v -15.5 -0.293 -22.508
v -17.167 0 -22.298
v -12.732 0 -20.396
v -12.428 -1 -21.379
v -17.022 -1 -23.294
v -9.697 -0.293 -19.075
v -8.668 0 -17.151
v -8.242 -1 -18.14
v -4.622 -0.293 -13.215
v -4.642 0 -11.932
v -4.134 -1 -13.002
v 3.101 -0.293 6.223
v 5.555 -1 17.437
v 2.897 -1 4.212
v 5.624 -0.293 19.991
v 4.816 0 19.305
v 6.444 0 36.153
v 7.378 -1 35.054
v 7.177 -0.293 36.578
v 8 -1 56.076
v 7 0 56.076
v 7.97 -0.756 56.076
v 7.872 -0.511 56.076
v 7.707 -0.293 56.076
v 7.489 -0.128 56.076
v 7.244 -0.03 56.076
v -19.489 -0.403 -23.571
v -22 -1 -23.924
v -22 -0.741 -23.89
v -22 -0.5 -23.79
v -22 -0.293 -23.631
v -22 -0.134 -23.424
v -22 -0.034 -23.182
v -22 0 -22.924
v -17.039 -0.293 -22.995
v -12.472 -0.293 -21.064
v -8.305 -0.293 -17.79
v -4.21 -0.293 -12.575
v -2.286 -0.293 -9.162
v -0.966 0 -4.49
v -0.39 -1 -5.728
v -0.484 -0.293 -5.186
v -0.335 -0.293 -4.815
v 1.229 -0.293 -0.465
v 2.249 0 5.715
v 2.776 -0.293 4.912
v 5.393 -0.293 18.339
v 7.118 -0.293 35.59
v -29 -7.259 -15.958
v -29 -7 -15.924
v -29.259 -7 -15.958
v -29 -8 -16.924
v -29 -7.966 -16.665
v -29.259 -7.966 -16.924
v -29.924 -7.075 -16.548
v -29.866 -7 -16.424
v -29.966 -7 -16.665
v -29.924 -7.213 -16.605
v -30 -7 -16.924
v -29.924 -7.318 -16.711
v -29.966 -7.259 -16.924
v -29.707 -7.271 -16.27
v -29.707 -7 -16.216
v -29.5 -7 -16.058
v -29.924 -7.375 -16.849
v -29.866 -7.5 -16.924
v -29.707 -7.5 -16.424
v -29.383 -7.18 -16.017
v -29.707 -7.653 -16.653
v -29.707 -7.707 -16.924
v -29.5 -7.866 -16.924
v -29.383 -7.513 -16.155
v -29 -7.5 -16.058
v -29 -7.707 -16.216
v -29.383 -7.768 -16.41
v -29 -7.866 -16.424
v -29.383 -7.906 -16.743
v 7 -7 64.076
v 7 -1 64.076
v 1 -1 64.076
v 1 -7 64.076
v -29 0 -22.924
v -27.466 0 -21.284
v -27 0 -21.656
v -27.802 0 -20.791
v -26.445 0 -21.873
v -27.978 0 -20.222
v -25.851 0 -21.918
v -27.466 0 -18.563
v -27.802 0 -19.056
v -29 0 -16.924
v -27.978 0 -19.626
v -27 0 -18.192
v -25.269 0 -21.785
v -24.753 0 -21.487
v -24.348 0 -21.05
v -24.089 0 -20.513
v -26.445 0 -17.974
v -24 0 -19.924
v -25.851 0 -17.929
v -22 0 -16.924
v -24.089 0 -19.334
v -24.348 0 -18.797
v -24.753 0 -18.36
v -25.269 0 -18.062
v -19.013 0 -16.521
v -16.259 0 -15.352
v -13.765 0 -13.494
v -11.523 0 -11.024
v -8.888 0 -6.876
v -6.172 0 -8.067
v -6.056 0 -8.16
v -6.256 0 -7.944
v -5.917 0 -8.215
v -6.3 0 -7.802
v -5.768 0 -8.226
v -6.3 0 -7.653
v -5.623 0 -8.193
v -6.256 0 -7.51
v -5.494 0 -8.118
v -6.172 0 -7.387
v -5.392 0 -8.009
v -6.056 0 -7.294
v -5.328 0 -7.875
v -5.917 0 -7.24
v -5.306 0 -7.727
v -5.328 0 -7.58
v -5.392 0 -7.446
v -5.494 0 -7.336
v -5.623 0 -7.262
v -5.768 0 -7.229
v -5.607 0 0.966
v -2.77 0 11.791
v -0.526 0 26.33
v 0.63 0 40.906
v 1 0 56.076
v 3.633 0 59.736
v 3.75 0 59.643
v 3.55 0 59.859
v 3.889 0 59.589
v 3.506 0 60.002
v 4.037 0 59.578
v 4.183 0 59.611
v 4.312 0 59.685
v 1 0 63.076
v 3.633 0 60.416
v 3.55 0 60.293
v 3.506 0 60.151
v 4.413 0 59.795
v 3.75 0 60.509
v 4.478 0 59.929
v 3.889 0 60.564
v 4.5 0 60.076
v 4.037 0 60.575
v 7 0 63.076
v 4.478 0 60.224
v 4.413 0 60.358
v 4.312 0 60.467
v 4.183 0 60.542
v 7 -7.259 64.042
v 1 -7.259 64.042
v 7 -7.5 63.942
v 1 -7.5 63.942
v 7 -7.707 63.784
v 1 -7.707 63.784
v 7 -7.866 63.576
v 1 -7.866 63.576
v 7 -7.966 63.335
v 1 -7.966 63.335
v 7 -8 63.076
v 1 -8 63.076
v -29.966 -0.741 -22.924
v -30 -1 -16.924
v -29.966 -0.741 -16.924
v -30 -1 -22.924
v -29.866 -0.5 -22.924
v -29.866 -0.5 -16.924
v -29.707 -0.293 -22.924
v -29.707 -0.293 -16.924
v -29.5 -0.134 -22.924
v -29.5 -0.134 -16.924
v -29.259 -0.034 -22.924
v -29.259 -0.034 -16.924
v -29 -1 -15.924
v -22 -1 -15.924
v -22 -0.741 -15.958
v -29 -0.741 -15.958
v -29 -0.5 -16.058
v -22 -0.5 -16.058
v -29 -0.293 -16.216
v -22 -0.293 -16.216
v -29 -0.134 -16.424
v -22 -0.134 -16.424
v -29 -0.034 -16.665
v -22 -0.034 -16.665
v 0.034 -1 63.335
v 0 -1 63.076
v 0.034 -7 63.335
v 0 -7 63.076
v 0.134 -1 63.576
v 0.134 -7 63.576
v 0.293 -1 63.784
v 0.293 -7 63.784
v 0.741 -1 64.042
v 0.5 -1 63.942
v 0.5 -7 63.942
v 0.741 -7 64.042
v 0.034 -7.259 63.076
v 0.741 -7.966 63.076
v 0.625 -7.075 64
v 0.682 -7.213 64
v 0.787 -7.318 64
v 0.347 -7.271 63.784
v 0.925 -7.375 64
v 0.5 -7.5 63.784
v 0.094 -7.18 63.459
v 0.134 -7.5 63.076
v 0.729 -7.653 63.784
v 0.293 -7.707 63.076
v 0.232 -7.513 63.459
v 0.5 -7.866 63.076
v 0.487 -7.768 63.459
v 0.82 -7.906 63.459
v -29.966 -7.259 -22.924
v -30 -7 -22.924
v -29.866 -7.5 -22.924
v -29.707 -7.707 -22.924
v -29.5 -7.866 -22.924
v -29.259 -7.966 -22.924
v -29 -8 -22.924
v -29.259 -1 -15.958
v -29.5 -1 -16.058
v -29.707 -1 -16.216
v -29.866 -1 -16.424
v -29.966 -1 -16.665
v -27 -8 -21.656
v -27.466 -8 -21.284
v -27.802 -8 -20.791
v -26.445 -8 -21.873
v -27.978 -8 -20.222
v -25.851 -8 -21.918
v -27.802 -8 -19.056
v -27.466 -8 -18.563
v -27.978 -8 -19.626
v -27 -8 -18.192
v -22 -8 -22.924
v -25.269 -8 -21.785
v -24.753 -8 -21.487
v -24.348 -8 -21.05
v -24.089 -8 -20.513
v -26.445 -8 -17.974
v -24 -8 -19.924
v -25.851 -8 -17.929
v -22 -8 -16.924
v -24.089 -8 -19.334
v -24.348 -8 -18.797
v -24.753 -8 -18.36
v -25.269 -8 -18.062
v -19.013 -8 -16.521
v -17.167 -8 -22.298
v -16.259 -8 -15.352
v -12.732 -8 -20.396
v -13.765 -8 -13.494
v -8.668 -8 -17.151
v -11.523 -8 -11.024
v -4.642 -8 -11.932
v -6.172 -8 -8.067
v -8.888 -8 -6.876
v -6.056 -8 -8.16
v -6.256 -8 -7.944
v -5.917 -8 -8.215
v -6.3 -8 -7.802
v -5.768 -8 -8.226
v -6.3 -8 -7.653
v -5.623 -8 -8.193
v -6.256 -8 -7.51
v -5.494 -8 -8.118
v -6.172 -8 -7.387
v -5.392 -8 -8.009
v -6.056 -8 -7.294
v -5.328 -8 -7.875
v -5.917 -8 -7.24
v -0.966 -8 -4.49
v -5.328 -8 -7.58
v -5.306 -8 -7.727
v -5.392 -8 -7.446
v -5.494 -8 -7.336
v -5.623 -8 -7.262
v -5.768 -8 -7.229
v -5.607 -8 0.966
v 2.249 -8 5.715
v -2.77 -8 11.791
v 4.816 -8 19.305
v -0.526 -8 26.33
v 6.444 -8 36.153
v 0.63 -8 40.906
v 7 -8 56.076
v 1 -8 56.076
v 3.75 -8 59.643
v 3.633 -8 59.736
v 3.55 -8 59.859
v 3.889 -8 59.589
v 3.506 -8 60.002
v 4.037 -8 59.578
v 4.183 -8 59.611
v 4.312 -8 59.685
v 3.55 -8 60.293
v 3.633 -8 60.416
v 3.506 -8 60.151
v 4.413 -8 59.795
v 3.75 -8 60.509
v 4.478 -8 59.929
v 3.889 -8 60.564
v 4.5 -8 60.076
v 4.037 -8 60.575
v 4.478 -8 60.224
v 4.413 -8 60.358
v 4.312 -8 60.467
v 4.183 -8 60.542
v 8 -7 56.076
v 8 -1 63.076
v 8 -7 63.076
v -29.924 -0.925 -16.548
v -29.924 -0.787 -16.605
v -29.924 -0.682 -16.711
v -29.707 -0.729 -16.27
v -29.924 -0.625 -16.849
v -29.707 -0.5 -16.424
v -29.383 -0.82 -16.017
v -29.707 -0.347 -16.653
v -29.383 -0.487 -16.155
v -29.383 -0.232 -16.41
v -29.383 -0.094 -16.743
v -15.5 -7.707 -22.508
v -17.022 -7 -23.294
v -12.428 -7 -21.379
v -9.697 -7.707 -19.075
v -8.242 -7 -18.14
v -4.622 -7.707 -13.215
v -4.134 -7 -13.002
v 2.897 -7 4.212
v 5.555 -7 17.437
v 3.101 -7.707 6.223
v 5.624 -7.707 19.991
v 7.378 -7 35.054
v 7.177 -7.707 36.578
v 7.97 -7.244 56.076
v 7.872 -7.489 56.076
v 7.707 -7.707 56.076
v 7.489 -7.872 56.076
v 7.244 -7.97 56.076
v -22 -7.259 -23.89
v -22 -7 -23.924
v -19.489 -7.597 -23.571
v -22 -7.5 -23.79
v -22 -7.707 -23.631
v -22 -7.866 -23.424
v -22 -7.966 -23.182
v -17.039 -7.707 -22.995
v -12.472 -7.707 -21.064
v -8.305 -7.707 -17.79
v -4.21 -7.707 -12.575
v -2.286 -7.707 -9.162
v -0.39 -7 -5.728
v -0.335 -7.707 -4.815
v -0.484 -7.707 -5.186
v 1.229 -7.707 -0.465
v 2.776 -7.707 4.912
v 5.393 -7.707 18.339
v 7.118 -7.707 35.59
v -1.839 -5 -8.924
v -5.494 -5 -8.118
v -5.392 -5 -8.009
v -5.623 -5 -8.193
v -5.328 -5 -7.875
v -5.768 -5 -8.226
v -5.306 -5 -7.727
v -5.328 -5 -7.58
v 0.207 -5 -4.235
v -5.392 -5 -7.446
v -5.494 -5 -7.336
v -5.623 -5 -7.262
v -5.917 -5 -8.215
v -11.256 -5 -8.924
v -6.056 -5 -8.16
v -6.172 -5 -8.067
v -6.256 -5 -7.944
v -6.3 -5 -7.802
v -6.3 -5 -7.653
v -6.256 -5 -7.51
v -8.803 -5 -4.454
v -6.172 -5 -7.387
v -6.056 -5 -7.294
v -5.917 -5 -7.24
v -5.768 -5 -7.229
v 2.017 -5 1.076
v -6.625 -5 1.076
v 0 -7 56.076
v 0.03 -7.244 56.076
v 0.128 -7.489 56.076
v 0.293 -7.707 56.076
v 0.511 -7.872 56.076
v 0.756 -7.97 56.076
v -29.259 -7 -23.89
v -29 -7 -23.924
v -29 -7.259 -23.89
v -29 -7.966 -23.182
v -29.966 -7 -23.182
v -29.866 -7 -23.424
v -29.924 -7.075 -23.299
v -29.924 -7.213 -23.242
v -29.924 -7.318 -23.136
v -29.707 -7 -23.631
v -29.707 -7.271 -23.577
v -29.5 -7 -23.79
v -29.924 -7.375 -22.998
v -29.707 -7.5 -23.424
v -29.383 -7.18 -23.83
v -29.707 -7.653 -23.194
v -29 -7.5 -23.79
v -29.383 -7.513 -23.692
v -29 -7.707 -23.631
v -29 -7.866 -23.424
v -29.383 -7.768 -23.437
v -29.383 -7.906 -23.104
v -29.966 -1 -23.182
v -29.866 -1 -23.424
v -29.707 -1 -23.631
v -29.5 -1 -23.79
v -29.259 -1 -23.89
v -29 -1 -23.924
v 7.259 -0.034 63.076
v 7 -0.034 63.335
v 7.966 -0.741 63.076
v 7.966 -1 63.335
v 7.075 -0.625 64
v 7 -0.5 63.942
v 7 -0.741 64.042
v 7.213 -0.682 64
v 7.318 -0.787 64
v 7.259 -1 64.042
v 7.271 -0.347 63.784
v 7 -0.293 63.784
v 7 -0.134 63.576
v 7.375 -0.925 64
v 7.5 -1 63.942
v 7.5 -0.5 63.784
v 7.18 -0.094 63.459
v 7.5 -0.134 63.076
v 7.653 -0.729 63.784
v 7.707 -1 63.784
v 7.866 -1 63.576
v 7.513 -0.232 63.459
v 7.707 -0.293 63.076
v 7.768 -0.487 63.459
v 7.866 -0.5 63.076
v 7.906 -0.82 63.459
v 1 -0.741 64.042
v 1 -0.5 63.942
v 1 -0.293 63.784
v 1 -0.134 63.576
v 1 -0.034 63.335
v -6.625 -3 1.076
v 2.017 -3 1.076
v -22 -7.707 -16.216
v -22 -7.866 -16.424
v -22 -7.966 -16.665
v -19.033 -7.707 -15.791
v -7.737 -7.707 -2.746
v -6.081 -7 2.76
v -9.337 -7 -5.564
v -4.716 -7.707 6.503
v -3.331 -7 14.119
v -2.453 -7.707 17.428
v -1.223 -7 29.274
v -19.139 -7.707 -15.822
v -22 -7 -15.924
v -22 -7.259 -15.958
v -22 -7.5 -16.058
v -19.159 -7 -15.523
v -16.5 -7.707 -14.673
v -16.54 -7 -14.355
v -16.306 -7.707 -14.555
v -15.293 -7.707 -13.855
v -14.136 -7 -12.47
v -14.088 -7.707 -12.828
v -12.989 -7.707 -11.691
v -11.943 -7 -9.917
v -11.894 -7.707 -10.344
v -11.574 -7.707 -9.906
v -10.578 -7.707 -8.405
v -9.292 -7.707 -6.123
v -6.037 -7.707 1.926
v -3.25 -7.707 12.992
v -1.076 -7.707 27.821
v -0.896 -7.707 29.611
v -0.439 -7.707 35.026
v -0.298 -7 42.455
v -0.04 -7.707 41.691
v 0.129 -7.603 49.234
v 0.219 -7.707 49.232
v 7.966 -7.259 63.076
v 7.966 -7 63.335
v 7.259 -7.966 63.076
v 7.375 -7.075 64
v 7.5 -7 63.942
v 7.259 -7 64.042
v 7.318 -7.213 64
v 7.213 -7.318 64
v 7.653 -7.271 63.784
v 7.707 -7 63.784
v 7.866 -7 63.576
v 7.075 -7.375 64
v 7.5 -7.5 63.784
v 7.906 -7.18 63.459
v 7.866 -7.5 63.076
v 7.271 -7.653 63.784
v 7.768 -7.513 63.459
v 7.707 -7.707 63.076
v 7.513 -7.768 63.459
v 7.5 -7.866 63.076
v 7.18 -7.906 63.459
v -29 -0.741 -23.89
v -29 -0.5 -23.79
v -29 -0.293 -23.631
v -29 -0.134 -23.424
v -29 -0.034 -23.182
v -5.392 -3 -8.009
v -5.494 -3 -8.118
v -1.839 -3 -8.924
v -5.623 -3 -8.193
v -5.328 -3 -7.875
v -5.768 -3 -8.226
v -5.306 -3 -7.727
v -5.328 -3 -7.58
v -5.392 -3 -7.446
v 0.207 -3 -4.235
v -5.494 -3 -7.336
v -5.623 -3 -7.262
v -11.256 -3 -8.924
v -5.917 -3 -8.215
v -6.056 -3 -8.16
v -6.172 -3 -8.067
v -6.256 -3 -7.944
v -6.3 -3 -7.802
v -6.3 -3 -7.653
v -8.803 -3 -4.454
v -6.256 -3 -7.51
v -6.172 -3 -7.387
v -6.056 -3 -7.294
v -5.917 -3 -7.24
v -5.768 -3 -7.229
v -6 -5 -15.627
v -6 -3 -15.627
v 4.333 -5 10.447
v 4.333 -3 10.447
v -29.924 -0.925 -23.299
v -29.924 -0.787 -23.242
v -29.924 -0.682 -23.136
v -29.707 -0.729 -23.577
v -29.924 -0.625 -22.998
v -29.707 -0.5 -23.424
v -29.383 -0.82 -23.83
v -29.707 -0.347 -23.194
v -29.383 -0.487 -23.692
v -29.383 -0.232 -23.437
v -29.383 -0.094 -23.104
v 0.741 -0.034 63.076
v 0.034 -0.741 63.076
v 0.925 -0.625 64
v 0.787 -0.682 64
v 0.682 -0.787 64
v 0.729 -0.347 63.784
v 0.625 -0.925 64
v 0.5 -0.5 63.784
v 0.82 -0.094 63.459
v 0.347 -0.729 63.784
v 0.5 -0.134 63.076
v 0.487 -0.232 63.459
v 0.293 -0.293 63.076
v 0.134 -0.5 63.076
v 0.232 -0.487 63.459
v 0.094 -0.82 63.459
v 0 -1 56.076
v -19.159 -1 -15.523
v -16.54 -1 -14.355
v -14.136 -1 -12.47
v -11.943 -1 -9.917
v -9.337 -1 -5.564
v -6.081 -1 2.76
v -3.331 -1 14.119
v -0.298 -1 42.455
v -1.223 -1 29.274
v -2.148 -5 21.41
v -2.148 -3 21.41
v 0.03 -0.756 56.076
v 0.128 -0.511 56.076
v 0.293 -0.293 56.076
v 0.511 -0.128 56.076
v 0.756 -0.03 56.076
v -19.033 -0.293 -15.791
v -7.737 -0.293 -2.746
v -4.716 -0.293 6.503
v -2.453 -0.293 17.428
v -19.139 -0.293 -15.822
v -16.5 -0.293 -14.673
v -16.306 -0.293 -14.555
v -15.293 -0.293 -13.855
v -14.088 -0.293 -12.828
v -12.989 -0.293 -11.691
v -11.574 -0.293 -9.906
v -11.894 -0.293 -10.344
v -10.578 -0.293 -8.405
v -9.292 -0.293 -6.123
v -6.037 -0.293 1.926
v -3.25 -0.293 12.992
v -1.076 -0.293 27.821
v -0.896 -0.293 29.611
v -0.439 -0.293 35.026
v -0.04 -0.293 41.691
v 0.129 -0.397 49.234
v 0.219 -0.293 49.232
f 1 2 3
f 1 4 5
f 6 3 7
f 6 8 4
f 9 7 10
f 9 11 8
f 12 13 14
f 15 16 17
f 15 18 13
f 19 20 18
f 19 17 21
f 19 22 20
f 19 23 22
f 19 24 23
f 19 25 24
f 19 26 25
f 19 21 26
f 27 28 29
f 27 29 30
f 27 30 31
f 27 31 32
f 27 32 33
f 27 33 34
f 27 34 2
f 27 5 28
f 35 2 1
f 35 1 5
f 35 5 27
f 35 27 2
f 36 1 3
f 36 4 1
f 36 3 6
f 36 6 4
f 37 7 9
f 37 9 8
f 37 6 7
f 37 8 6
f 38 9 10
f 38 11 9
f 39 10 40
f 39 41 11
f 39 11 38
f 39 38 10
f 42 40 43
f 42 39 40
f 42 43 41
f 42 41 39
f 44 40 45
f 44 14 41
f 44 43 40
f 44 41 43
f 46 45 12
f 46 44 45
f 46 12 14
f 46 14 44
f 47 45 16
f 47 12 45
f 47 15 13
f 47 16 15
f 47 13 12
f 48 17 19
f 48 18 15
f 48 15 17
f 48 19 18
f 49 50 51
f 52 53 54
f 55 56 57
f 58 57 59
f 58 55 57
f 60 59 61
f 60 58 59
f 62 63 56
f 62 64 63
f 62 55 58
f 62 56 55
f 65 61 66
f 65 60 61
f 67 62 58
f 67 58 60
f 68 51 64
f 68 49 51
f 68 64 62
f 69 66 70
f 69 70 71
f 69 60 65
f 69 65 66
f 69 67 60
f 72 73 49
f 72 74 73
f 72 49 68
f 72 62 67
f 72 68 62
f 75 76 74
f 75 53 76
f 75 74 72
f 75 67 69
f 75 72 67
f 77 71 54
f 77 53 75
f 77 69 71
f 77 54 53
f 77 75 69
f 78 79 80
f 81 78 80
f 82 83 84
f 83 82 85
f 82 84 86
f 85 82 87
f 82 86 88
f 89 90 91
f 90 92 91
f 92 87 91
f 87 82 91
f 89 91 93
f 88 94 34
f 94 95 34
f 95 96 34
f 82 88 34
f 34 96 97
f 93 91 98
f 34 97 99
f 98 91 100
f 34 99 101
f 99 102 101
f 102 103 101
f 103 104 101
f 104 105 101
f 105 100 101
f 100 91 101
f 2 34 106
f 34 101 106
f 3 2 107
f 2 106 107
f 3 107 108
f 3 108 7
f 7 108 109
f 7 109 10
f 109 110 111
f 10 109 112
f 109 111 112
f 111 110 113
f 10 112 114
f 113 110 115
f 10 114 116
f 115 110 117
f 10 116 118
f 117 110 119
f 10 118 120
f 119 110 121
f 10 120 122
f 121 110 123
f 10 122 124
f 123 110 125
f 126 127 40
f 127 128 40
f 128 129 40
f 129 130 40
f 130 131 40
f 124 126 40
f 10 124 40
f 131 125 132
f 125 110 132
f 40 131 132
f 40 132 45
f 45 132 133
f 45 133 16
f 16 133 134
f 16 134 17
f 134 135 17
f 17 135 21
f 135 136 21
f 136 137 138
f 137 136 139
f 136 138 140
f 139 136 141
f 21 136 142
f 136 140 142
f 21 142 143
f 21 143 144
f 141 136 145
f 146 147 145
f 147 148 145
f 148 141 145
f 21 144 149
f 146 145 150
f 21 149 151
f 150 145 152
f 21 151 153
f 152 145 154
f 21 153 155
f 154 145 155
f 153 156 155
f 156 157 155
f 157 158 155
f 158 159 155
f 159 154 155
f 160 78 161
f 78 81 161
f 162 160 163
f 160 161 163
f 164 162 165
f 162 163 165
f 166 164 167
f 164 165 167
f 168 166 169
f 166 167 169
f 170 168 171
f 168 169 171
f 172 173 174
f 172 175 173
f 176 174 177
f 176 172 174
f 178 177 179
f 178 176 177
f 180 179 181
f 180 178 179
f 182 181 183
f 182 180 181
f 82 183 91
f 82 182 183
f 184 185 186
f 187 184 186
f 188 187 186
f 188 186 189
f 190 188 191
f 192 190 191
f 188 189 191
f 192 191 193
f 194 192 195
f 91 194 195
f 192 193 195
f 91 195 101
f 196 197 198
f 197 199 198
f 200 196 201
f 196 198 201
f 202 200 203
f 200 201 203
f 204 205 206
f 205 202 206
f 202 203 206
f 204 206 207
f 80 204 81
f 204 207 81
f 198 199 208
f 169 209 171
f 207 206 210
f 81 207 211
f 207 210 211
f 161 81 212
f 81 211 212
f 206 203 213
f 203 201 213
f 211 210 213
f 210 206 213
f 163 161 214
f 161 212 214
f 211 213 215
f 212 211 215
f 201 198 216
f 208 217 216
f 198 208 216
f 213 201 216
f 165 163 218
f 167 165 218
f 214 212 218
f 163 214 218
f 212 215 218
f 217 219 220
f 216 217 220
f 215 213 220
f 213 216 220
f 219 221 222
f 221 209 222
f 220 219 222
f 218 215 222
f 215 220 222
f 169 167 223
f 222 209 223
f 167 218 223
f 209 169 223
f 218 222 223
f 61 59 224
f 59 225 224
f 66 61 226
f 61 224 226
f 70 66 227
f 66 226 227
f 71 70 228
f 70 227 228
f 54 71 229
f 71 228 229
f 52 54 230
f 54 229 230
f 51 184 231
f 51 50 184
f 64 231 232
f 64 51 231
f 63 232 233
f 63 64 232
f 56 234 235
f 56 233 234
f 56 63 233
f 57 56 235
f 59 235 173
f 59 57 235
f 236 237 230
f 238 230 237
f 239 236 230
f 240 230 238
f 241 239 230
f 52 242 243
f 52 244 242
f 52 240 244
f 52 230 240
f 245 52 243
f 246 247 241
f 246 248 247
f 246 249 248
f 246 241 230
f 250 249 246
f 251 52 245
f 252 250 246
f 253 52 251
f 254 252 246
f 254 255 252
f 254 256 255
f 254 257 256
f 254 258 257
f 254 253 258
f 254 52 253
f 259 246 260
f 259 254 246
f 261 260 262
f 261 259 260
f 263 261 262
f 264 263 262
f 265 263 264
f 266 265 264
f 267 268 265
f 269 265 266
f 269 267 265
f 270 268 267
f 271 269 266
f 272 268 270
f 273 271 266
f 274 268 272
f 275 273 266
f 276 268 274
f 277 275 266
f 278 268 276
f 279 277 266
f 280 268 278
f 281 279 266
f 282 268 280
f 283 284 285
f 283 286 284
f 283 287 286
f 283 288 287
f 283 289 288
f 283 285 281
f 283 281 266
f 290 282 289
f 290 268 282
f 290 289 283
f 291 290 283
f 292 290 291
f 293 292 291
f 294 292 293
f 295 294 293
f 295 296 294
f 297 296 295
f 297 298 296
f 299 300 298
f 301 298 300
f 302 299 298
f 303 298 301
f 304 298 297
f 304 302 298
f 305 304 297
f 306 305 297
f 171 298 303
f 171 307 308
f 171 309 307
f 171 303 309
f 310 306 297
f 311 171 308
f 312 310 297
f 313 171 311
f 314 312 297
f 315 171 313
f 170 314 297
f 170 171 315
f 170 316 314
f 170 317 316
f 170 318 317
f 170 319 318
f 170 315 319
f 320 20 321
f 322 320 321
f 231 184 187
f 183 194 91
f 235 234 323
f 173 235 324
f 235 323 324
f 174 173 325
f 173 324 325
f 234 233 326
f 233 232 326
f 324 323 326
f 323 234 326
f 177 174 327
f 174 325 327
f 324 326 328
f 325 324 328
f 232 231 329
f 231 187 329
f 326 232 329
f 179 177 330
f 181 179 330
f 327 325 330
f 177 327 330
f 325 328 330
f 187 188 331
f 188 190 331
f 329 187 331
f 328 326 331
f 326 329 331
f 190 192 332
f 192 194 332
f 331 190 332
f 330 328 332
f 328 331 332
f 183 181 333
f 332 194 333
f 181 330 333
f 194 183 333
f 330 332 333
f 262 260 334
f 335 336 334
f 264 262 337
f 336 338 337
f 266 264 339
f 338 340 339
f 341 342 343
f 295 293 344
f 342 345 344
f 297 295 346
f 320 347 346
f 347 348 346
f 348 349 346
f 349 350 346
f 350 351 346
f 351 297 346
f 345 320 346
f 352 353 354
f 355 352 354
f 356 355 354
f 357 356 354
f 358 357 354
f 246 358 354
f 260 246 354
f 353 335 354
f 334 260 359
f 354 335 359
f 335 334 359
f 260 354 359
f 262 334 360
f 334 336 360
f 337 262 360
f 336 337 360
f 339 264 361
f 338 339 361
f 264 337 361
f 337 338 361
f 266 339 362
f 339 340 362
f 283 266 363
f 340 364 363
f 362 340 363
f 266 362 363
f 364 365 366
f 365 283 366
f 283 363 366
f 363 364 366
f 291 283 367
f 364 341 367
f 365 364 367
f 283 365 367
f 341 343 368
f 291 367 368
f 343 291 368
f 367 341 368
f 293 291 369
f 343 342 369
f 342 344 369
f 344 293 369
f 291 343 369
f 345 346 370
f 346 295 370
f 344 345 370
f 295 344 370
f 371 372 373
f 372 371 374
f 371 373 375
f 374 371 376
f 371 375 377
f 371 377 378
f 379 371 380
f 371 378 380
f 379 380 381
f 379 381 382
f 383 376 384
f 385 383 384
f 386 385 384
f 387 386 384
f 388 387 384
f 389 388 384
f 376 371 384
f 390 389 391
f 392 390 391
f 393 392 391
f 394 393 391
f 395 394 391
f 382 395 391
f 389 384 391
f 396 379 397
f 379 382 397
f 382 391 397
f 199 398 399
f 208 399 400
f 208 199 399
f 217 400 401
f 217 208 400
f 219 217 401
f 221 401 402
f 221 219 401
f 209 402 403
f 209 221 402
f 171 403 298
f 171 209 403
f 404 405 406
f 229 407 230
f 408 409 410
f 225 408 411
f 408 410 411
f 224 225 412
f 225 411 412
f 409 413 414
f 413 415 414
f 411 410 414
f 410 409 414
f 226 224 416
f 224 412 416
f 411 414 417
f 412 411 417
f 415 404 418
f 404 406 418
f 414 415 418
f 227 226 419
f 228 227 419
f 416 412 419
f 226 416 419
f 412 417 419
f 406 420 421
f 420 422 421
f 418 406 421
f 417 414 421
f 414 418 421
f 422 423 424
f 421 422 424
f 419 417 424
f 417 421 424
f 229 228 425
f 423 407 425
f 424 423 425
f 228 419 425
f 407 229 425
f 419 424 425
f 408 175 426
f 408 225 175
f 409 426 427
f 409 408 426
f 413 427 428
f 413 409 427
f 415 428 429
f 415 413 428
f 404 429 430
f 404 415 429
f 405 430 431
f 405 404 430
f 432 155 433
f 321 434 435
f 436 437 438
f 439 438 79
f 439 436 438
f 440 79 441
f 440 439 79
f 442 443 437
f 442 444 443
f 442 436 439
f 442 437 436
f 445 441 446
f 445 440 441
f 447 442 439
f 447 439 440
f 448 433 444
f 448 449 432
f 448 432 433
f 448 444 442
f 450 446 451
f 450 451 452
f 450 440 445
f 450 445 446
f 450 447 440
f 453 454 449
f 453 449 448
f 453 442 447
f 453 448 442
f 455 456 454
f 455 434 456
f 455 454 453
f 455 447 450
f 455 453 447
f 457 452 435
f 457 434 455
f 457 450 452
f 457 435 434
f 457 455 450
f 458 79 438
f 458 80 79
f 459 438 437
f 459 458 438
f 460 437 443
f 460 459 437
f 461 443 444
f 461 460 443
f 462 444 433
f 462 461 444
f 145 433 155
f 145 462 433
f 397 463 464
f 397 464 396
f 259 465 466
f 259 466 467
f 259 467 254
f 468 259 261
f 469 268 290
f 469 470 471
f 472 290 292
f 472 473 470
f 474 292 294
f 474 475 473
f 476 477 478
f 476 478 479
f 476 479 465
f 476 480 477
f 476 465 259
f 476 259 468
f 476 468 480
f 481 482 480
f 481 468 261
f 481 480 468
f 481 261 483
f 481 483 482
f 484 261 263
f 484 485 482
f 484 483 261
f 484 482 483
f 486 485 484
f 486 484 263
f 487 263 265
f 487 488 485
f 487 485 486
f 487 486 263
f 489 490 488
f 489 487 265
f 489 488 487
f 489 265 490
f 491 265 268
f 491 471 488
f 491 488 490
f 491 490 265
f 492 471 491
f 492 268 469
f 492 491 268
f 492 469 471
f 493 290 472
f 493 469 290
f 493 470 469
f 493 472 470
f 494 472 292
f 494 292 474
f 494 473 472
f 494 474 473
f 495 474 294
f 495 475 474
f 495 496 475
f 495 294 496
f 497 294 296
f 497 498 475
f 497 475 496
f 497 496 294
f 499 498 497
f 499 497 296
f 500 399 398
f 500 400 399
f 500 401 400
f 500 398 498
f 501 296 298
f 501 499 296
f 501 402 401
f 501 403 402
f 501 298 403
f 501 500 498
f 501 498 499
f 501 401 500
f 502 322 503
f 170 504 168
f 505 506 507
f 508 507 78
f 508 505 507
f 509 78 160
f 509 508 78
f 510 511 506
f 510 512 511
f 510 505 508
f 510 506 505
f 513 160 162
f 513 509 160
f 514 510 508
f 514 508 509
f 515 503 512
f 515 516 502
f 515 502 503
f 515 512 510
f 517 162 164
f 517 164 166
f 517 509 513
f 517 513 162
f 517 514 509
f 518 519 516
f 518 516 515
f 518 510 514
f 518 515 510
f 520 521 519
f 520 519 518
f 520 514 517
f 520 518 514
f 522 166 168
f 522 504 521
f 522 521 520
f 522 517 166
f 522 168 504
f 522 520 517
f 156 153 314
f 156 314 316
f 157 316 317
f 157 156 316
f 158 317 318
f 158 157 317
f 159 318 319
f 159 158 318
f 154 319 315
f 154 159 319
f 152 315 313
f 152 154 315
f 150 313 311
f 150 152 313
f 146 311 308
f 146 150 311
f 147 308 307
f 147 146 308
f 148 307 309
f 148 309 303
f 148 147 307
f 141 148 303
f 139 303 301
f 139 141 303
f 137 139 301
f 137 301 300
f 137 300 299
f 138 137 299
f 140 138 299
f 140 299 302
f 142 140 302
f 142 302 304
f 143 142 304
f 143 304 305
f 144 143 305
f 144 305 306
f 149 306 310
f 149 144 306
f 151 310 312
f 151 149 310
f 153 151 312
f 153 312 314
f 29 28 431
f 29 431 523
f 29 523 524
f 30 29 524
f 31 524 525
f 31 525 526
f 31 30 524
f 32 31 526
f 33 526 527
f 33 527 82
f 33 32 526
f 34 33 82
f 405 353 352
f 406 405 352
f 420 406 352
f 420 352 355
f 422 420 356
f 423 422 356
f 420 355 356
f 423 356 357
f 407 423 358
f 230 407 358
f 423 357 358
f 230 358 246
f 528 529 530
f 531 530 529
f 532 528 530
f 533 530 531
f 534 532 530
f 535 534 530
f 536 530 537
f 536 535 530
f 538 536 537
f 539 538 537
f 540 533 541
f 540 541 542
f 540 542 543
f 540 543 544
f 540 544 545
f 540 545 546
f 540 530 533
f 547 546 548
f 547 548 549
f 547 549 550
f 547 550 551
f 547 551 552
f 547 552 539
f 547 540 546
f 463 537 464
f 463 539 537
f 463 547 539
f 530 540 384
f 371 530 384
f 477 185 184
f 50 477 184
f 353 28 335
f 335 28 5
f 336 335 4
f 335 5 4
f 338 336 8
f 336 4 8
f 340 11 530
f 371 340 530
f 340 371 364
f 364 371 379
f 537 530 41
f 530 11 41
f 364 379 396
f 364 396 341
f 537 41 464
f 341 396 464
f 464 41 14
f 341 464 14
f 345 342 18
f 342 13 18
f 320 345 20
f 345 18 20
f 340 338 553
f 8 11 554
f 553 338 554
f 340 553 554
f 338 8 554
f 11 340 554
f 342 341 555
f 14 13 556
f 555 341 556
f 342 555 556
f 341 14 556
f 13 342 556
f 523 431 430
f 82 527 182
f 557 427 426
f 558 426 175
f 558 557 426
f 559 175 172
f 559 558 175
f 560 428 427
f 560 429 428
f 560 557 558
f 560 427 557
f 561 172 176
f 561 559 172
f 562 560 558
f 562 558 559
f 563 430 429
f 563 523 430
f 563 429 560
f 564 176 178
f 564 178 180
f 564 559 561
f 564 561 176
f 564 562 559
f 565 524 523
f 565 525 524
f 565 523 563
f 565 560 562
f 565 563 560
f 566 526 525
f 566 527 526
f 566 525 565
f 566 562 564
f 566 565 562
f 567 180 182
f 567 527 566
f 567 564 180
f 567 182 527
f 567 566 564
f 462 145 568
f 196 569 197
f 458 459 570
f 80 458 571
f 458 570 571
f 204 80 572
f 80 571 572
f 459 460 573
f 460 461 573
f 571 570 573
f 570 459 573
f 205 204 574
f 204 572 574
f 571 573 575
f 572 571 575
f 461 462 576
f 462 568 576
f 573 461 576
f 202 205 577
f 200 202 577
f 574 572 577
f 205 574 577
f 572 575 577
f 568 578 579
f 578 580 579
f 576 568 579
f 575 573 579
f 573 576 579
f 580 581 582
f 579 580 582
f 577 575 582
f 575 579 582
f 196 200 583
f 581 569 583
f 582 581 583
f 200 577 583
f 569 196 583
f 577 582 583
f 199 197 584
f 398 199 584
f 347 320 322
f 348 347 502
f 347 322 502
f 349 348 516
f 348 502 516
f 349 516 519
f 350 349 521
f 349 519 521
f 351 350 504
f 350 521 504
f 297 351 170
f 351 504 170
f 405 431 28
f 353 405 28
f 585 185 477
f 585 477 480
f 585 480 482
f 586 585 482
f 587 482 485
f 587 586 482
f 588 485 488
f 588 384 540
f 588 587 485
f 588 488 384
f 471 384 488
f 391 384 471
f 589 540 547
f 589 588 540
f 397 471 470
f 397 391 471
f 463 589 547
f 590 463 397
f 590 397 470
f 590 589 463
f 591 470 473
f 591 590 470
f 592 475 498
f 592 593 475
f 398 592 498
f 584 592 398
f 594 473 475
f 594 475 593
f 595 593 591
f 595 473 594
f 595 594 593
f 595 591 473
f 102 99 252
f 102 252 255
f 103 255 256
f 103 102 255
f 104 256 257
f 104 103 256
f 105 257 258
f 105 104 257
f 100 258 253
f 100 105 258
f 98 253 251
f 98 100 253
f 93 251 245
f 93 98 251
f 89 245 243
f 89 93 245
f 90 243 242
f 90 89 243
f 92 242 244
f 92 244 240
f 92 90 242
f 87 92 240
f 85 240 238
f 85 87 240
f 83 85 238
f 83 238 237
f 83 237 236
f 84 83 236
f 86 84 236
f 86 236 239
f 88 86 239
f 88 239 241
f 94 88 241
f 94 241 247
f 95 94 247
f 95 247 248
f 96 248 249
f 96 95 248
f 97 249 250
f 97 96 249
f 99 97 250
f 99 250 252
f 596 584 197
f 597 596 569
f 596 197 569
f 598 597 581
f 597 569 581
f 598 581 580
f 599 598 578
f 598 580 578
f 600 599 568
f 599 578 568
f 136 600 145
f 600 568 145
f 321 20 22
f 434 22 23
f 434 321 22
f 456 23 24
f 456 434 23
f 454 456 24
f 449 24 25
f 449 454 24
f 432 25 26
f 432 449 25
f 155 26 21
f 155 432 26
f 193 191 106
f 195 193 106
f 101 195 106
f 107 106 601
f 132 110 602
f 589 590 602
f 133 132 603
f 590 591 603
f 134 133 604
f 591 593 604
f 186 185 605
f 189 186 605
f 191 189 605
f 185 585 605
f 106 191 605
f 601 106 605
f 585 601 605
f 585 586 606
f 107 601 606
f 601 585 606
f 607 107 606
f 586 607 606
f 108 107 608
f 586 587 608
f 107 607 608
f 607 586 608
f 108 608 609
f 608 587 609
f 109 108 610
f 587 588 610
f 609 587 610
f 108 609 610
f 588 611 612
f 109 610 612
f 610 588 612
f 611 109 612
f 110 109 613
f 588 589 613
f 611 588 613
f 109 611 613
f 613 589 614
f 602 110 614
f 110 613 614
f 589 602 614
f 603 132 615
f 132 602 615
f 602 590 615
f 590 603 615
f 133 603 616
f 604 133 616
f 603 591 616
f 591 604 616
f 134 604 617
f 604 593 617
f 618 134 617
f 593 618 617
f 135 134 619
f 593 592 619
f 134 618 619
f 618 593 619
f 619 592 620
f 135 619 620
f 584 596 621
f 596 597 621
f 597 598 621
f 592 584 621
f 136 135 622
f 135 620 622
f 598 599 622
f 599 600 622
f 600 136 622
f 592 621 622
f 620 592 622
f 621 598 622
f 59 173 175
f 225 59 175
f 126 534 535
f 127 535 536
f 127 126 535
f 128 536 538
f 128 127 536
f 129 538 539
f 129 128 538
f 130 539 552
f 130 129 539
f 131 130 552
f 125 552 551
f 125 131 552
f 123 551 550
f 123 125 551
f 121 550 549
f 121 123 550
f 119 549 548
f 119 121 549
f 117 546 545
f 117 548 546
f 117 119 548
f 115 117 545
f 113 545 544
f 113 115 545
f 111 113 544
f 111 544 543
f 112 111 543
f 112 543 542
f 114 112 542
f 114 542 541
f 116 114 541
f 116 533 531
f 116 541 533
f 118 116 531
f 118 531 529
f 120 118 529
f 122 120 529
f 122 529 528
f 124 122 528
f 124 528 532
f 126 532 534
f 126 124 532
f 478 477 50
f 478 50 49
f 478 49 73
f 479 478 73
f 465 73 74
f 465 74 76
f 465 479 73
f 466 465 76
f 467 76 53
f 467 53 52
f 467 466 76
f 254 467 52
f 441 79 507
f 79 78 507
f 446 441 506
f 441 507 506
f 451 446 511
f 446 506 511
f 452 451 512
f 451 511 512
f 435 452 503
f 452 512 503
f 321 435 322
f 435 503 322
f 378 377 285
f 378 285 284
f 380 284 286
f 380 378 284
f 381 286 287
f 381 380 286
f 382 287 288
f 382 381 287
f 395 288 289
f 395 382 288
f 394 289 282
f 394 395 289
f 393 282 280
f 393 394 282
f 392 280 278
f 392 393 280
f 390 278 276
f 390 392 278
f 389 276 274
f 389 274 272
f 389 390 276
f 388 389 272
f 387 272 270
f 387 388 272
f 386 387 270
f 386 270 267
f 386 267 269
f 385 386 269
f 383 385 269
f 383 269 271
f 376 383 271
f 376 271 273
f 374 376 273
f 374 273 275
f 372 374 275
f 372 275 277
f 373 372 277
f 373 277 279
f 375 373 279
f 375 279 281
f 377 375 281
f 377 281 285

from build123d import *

# Parameters (mm, degrees)
F0_R     = 2
F0_R_2   = 0.5
F1_DEPTH = 8
F2_R     = 1
F3_W     = 2
F3_H     = 10
F4_DEPTH = 25


with BuildPart() as f1:
    # F0 (on Front) → F1 (new body)
    with BuildSketch(Plane.XZ):
        with BuildLine():
            Line((-22, -15.923589), (-30, -15.923589))
            Line((-30, -15.923589), (-30, -23.923589))
            Line((-30, -23.923589), (-22, -23.923589))
            add(Edge.make_bspline(
                [(-22, -23.923589), (-3.5, -23.923589), (8, 0.076411), (8, 56.076411)],
                knots=[0, 0, 0, 0, 85.440037, 85.440037, 85.440037, 85.440037], degree=3))
            Line((8, 56.076411), (8, 64.076411))
            Line((8, 64.076411), (0, 64.076411))
            Line((0, 64.076411), (0, 56.076411))
            add(Edge.make_bspline(
                [(-22, -15.923589), (-6, -15.923589), (0, 20.076411), (0, 56.076411)],
                knots=[0, 0, 0, 0, 75.286121, 75.286121, 75.286121, 75.286121], degree=3))
        make_face()
        with Locations((-26, -19.923589)):
            Circle(F0_R, mode=Mode.SUBTRACT)
        with Locations((-5.805514, -7.727215)):
            Circle(F0_R_2, mode=Mode.SUBTRACT)
        with Locations((4, 60.076411)):
            Circle(F0_R_2, mode=Mode.SUBTRACT)
    extrude(amount=F1_DEPTH)

    # F2
    f2_edges = [f1.edges().sort_by_distance(p)[0] for p in [
        (4.219234, -8, 9.887274),
        (4.219234, 0, 9.887274),
        (-2.955442, -8, 16.205486),
        (-2.955442, 0, 16.205486),
        (0, 0, 60.076411),
        (4, 0, 64.076411),
        (8, -4, 64.076411),
        (0, -4, 64.076411),
        (4, -8, 64.076411),
        (-30, -4, -15.923589),
        (-30, -4, -23.923589),
        (-30, 0, -19.923589),
        (-30, -8, -19.923589),
    ]]
    fillet(f2_edges, radius=F2_R)

    # F3 (on face) → F4 (cut, symmetric)
    with BuildSketch(Plane(origin=(0, 0, 0), x_dir=(0, -1, 0), z_dir=(-1, 0, 0))):
        with Locations((4, -3.923589)):
            Rectangle(F3_W, F3_H)
    extrude(amount=F4_DEPTH, both=True, mode=Mode.SUBTRACT)


solid = f1.part
